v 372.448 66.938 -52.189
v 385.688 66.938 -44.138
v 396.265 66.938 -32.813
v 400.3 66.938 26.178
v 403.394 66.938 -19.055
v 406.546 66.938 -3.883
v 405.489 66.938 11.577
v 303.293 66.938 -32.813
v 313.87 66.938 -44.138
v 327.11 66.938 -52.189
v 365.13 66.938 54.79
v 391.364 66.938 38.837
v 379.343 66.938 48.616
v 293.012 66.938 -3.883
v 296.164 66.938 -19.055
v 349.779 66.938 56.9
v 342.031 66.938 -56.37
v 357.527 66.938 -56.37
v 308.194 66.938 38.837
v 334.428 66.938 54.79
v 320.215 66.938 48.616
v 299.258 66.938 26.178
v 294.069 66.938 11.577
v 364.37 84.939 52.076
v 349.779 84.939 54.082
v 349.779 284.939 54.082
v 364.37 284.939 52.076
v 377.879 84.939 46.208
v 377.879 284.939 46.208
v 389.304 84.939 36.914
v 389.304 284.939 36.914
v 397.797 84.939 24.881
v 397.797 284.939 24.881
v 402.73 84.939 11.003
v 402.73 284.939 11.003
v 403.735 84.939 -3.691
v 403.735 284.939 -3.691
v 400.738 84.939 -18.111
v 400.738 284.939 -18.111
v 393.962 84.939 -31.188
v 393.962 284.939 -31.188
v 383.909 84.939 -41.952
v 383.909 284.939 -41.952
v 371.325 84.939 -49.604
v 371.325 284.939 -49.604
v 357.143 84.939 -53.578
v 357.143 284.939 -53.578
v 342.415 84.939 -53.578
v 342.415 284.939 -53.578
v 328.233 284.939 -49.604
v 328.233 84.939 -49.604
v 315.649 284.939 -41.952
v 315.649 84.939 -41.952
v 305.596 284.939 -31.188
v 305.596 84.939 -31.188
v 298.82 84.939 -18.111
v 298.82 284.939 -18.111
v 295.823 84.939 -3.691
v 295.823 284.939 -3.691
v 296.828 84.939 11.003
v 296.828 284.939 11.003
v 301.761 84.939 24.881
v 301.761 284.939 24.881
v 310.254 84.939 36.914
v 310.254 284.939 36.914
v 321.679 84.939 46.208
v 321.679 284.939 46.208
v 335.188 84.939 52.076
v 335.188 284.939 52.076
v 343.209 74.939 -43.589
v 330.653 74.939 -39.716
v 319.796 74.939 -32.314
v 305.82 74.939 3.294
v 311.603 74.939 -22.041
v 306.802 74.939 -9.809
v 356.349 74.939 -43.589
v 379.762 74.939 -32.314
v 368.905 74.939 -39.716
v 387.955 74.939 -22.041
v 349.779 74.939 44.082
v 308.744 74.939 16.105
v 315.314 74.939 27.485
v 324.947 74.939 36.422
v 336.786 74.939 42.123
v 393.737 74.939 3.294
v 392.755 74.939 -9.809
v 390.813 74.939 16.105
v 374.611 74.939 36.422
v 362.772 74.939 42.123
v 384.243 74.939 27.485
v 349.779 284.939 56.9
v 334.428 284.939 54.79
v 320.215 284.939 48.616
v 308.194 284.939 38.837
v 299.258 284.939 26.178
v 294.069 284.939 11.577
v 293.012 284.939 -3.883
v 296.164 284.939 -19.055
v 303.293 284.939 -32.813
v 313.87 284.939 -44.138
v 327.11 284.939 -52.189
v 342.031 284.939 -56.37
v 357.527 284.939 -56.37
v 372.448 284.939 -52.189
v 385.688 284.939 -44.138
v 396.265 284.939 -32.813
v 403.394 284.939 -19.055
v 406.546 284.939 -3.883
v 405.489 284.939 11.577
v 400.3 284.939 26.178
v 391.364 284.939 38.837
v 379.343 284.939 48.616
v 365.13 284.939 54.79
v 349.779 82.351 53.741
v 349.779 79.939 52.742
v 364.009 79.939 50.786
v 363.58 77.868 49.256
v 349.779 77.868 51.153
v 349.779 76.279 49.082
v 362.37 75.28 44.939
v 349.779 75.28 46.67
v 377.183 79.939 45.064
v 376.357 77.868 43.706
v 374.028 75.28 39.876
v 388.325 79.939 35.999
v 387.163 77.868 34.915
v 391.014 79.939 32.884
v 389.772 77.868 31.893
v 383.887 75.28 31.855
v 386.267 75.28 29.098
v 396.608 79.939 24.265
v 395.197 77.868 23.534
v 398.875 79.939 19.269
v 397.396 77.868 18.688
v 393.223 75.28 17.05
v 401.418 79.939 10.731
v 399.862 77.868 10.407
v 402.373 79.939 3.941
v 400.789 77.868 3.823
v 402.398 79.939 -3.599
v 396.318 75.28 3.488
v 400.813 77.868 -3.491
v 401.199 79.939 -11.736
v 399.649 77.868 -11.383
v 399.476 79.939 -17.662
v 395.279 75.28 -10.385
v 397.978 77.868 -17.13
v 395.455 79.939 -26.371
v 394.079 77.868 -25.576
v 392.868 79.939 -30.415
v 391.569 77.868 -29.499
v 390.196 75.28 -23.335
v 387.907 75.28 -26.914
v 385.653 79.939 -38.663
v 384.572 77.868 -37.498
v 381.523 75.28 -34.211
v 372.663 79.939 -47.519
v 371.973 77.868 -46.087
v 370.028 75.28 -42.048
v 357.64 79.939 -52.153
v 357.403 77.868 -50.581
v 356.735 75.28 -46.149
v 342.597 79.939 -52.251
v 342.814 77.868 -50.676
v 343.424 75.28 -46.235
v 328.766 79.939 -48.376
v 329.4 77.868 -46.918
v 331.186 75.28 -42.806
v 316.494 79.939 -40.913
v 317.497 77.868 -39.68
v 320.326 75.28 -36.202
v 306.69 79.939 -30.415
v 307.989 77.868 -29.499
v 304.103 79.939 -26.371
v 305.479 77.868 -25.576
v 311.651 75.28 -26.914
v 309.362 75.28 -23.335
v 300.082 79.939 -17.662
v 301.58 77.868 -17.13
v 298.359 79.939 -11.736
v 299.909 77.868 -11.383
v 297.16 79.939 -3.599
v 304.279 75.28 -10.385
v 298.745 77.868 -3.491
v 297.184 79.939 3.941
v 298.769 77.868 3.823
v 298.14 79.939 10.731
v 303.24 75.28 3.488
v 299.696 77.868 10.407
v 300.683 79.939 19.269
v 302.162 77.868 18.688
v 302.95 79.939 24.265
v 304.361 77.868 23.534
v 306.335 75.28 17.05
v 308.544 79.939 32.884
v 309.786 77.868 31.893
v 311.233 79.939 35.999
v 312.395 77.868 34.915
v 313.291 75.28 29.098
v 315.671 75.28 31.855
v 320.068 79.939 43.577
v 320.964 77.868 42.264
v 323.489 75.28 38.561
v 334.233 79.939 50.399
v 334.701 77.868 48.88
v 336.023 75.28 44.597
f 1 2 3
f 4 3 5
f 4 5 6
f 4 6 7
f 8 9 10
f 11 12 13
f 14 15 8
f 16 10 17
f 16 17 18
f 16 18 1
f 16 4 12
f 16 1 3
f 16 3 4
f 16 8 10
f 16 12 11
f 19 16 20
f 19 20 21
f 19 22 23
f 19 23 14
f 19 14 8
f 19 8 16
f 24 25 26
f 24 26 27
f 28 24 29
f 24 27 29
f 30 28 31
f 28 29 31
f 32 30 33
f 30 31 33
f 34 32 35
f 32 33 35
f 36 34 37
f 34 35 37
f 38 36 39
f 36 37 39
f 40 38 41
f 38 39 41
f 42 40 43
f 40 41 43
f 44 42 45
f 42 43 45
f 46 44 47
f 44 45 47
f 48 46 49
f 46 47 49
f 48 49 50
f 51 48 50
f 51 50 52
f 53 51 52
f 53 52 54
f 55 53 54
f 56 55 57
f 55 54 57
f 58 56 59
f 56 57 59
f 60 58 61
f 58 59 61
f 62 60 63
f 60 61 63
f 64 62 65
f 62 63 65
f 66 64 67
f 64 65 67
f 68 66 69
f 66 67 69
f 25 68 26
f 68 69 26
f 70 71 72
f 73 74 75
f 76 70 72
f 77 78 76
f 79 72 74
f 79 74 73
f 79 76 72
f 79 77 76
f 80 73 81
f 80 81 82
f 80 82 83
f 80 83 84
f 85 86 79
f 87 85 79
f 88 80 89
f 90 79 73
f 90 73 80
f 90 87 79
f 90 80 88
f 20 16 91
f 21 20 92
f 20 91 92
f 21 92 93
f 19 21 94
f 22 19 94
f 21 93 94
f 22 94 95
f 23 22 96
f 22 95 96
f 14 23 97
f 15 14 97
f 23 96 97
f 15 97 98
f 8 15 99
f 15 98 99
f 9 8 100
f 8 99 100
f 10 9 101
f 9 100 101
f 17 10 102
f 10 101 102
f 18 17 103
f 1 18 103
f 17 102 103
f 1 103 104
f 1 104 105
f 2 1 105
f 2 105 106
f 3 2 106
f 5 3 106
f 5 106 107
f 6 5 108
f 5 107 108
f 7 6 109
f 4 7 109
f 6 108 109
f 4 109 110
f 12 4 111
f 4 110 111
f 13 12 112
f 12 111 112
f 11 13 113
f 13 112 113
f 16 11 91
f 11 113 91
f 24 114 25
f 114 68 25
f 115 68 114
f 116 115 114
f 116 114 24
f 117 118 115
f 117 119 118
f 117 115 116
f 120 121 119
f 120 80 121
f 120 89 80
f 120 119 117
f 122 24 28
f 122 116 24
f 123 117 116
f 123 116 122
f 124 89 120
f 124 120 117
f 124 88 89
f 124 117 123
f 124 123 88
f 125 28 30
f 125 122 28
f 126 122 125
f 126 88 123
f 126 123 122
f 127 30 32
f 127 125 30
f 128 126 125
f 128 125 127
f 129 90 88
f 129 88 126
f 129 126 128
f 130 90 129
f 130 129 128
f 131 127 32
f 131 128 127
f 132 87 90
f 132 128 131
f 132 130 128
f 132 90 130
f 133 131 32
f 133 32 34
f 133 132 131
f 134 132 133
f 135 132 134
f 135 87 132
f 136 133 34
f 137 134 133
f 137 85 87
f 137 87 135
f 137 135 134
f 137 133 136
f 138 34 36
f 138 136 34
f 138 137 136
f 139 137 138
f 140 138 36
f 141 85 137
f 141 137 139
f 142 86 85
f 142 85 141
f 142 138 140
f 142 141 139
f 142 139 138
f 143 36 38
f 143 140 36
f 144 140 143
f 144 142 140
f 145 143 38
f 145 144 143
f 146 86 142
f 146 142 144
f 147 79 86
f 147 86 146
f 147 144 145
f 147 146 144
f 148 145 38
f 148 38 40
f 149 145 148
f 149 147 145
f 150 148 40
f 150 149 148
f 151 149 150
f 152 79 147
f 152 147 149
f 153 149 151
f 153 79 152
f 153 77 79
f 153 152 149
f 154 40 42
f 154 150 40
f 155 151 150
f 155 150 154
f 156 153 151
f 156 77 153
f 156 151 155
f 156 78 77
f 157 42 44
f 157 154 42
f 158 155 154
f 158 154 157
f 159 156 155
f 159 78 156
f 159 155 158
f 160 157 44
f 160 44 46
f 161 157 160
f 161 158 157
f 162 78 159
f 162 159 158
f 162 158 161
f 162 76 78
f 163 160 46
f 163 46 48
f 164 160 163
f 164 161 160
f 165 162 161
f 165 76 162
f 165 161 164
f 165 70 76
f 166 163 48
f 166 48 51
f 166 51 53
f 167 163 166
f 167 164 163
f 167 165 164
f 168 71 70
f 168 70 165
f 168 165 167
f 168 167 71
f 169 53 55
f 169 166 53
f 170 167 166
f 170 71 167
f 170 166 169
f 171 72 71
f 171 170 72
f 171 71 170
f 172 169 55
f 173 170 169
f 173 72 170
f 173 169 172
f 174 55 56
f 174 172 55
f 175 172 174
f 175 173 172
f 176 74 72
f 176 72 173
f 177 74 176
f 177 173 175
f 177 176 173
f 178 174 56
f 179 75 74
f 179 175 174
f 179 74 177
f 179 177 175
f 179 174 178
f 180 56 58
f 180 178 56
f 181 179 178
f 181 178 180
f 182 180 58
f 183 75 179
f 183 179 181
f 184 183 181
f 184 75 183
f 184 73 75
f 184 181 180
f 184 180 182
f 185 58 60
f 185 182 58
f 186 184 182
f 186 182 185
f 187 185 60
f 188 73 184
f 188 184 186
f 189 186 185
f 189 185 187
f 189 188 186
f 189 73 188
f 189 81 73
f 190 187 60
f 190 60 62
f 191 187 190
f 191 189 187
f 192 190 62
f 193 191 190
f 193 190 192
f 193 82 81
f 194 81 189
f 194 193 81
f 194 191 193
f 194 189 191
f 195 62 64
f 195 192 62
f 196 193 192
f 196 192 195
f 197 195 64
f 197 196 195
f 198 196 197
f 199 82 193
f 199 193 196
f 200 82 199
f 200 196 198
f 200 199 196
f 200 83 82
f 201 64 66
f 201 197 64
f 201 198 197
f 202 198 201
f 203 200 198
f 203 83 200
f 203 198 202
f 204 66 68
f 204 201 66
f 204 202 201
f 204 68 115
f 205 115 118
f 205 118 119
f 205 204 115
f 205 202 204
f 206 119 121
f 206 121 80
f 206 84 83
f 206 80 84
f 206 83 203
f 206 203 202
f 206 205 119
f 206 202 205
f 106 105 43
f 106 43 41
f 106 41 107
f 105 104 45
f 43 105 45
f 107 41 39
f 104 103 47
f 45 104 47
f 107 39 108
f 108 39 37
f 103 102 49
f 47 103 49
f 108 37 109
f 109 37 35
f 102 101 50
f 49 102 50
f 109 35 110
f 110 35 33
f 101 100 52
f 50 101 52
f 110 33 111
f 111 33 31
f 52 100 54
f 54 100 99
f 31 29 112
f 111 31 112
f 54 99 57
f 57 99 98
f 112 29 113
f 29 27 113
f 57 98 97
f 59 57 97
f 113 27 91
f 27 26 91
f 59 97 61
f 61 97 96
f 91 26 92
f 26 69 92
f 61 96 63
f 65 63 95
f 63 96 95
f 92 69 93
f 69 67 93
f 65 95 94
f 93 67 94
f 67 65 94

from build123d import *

# Parameters (mm, degrees)
SKETCH2_W          = 56.9
SKETCH2_H          = 218.001042519
SKETCH3_R          = 54.081739793
CUT_EXTRUDE1_DEPTH = 210
FILLET1_R          = 10


with BuildPart() as part:
    # Sketch2 → Revolve2 (revolve)
    with BuildSketch(Plane.XY, mode=Mode.PRIVATE) as revolve2_sk:
        with Locations((321.328943302, 175.938289097)):
            Rectangle(SKETCH2_W, SKETCH2_H)
    revolve(revolve2_sk.sketch.rotate(Axis((349.778943302, 284.938810356, 0), (0, -1, 0)), 270), axis=Axis((349.778943302, 284.938810356, 0), (0, -1, 0)))

    # Sketch3 → Cut-Extrude1 (cut)
    with BuildSketch(Plane(origin=(0, 284.938810356, 0), x_dir=(1, 0, 0), z_dir=(0, 1, 0))):
        with Locations(Location((349.778943302, 0, 0), (0, 0, 270))):
            Circle(SKETCH3_R)
    extrude(amount=-CUT_EXTRUDE1_DEPTH, mode=Mode.SUBTRACT)

    # Fillet1
    fillet1_edges = [part.edges().sort_by_distance(p)[0] for p in [
        (349.778943302, 74.938810356, -54.081739793),
    ]]
    fillet(fillet1_edges, radius=FILLET1_R)


solid = part.part
